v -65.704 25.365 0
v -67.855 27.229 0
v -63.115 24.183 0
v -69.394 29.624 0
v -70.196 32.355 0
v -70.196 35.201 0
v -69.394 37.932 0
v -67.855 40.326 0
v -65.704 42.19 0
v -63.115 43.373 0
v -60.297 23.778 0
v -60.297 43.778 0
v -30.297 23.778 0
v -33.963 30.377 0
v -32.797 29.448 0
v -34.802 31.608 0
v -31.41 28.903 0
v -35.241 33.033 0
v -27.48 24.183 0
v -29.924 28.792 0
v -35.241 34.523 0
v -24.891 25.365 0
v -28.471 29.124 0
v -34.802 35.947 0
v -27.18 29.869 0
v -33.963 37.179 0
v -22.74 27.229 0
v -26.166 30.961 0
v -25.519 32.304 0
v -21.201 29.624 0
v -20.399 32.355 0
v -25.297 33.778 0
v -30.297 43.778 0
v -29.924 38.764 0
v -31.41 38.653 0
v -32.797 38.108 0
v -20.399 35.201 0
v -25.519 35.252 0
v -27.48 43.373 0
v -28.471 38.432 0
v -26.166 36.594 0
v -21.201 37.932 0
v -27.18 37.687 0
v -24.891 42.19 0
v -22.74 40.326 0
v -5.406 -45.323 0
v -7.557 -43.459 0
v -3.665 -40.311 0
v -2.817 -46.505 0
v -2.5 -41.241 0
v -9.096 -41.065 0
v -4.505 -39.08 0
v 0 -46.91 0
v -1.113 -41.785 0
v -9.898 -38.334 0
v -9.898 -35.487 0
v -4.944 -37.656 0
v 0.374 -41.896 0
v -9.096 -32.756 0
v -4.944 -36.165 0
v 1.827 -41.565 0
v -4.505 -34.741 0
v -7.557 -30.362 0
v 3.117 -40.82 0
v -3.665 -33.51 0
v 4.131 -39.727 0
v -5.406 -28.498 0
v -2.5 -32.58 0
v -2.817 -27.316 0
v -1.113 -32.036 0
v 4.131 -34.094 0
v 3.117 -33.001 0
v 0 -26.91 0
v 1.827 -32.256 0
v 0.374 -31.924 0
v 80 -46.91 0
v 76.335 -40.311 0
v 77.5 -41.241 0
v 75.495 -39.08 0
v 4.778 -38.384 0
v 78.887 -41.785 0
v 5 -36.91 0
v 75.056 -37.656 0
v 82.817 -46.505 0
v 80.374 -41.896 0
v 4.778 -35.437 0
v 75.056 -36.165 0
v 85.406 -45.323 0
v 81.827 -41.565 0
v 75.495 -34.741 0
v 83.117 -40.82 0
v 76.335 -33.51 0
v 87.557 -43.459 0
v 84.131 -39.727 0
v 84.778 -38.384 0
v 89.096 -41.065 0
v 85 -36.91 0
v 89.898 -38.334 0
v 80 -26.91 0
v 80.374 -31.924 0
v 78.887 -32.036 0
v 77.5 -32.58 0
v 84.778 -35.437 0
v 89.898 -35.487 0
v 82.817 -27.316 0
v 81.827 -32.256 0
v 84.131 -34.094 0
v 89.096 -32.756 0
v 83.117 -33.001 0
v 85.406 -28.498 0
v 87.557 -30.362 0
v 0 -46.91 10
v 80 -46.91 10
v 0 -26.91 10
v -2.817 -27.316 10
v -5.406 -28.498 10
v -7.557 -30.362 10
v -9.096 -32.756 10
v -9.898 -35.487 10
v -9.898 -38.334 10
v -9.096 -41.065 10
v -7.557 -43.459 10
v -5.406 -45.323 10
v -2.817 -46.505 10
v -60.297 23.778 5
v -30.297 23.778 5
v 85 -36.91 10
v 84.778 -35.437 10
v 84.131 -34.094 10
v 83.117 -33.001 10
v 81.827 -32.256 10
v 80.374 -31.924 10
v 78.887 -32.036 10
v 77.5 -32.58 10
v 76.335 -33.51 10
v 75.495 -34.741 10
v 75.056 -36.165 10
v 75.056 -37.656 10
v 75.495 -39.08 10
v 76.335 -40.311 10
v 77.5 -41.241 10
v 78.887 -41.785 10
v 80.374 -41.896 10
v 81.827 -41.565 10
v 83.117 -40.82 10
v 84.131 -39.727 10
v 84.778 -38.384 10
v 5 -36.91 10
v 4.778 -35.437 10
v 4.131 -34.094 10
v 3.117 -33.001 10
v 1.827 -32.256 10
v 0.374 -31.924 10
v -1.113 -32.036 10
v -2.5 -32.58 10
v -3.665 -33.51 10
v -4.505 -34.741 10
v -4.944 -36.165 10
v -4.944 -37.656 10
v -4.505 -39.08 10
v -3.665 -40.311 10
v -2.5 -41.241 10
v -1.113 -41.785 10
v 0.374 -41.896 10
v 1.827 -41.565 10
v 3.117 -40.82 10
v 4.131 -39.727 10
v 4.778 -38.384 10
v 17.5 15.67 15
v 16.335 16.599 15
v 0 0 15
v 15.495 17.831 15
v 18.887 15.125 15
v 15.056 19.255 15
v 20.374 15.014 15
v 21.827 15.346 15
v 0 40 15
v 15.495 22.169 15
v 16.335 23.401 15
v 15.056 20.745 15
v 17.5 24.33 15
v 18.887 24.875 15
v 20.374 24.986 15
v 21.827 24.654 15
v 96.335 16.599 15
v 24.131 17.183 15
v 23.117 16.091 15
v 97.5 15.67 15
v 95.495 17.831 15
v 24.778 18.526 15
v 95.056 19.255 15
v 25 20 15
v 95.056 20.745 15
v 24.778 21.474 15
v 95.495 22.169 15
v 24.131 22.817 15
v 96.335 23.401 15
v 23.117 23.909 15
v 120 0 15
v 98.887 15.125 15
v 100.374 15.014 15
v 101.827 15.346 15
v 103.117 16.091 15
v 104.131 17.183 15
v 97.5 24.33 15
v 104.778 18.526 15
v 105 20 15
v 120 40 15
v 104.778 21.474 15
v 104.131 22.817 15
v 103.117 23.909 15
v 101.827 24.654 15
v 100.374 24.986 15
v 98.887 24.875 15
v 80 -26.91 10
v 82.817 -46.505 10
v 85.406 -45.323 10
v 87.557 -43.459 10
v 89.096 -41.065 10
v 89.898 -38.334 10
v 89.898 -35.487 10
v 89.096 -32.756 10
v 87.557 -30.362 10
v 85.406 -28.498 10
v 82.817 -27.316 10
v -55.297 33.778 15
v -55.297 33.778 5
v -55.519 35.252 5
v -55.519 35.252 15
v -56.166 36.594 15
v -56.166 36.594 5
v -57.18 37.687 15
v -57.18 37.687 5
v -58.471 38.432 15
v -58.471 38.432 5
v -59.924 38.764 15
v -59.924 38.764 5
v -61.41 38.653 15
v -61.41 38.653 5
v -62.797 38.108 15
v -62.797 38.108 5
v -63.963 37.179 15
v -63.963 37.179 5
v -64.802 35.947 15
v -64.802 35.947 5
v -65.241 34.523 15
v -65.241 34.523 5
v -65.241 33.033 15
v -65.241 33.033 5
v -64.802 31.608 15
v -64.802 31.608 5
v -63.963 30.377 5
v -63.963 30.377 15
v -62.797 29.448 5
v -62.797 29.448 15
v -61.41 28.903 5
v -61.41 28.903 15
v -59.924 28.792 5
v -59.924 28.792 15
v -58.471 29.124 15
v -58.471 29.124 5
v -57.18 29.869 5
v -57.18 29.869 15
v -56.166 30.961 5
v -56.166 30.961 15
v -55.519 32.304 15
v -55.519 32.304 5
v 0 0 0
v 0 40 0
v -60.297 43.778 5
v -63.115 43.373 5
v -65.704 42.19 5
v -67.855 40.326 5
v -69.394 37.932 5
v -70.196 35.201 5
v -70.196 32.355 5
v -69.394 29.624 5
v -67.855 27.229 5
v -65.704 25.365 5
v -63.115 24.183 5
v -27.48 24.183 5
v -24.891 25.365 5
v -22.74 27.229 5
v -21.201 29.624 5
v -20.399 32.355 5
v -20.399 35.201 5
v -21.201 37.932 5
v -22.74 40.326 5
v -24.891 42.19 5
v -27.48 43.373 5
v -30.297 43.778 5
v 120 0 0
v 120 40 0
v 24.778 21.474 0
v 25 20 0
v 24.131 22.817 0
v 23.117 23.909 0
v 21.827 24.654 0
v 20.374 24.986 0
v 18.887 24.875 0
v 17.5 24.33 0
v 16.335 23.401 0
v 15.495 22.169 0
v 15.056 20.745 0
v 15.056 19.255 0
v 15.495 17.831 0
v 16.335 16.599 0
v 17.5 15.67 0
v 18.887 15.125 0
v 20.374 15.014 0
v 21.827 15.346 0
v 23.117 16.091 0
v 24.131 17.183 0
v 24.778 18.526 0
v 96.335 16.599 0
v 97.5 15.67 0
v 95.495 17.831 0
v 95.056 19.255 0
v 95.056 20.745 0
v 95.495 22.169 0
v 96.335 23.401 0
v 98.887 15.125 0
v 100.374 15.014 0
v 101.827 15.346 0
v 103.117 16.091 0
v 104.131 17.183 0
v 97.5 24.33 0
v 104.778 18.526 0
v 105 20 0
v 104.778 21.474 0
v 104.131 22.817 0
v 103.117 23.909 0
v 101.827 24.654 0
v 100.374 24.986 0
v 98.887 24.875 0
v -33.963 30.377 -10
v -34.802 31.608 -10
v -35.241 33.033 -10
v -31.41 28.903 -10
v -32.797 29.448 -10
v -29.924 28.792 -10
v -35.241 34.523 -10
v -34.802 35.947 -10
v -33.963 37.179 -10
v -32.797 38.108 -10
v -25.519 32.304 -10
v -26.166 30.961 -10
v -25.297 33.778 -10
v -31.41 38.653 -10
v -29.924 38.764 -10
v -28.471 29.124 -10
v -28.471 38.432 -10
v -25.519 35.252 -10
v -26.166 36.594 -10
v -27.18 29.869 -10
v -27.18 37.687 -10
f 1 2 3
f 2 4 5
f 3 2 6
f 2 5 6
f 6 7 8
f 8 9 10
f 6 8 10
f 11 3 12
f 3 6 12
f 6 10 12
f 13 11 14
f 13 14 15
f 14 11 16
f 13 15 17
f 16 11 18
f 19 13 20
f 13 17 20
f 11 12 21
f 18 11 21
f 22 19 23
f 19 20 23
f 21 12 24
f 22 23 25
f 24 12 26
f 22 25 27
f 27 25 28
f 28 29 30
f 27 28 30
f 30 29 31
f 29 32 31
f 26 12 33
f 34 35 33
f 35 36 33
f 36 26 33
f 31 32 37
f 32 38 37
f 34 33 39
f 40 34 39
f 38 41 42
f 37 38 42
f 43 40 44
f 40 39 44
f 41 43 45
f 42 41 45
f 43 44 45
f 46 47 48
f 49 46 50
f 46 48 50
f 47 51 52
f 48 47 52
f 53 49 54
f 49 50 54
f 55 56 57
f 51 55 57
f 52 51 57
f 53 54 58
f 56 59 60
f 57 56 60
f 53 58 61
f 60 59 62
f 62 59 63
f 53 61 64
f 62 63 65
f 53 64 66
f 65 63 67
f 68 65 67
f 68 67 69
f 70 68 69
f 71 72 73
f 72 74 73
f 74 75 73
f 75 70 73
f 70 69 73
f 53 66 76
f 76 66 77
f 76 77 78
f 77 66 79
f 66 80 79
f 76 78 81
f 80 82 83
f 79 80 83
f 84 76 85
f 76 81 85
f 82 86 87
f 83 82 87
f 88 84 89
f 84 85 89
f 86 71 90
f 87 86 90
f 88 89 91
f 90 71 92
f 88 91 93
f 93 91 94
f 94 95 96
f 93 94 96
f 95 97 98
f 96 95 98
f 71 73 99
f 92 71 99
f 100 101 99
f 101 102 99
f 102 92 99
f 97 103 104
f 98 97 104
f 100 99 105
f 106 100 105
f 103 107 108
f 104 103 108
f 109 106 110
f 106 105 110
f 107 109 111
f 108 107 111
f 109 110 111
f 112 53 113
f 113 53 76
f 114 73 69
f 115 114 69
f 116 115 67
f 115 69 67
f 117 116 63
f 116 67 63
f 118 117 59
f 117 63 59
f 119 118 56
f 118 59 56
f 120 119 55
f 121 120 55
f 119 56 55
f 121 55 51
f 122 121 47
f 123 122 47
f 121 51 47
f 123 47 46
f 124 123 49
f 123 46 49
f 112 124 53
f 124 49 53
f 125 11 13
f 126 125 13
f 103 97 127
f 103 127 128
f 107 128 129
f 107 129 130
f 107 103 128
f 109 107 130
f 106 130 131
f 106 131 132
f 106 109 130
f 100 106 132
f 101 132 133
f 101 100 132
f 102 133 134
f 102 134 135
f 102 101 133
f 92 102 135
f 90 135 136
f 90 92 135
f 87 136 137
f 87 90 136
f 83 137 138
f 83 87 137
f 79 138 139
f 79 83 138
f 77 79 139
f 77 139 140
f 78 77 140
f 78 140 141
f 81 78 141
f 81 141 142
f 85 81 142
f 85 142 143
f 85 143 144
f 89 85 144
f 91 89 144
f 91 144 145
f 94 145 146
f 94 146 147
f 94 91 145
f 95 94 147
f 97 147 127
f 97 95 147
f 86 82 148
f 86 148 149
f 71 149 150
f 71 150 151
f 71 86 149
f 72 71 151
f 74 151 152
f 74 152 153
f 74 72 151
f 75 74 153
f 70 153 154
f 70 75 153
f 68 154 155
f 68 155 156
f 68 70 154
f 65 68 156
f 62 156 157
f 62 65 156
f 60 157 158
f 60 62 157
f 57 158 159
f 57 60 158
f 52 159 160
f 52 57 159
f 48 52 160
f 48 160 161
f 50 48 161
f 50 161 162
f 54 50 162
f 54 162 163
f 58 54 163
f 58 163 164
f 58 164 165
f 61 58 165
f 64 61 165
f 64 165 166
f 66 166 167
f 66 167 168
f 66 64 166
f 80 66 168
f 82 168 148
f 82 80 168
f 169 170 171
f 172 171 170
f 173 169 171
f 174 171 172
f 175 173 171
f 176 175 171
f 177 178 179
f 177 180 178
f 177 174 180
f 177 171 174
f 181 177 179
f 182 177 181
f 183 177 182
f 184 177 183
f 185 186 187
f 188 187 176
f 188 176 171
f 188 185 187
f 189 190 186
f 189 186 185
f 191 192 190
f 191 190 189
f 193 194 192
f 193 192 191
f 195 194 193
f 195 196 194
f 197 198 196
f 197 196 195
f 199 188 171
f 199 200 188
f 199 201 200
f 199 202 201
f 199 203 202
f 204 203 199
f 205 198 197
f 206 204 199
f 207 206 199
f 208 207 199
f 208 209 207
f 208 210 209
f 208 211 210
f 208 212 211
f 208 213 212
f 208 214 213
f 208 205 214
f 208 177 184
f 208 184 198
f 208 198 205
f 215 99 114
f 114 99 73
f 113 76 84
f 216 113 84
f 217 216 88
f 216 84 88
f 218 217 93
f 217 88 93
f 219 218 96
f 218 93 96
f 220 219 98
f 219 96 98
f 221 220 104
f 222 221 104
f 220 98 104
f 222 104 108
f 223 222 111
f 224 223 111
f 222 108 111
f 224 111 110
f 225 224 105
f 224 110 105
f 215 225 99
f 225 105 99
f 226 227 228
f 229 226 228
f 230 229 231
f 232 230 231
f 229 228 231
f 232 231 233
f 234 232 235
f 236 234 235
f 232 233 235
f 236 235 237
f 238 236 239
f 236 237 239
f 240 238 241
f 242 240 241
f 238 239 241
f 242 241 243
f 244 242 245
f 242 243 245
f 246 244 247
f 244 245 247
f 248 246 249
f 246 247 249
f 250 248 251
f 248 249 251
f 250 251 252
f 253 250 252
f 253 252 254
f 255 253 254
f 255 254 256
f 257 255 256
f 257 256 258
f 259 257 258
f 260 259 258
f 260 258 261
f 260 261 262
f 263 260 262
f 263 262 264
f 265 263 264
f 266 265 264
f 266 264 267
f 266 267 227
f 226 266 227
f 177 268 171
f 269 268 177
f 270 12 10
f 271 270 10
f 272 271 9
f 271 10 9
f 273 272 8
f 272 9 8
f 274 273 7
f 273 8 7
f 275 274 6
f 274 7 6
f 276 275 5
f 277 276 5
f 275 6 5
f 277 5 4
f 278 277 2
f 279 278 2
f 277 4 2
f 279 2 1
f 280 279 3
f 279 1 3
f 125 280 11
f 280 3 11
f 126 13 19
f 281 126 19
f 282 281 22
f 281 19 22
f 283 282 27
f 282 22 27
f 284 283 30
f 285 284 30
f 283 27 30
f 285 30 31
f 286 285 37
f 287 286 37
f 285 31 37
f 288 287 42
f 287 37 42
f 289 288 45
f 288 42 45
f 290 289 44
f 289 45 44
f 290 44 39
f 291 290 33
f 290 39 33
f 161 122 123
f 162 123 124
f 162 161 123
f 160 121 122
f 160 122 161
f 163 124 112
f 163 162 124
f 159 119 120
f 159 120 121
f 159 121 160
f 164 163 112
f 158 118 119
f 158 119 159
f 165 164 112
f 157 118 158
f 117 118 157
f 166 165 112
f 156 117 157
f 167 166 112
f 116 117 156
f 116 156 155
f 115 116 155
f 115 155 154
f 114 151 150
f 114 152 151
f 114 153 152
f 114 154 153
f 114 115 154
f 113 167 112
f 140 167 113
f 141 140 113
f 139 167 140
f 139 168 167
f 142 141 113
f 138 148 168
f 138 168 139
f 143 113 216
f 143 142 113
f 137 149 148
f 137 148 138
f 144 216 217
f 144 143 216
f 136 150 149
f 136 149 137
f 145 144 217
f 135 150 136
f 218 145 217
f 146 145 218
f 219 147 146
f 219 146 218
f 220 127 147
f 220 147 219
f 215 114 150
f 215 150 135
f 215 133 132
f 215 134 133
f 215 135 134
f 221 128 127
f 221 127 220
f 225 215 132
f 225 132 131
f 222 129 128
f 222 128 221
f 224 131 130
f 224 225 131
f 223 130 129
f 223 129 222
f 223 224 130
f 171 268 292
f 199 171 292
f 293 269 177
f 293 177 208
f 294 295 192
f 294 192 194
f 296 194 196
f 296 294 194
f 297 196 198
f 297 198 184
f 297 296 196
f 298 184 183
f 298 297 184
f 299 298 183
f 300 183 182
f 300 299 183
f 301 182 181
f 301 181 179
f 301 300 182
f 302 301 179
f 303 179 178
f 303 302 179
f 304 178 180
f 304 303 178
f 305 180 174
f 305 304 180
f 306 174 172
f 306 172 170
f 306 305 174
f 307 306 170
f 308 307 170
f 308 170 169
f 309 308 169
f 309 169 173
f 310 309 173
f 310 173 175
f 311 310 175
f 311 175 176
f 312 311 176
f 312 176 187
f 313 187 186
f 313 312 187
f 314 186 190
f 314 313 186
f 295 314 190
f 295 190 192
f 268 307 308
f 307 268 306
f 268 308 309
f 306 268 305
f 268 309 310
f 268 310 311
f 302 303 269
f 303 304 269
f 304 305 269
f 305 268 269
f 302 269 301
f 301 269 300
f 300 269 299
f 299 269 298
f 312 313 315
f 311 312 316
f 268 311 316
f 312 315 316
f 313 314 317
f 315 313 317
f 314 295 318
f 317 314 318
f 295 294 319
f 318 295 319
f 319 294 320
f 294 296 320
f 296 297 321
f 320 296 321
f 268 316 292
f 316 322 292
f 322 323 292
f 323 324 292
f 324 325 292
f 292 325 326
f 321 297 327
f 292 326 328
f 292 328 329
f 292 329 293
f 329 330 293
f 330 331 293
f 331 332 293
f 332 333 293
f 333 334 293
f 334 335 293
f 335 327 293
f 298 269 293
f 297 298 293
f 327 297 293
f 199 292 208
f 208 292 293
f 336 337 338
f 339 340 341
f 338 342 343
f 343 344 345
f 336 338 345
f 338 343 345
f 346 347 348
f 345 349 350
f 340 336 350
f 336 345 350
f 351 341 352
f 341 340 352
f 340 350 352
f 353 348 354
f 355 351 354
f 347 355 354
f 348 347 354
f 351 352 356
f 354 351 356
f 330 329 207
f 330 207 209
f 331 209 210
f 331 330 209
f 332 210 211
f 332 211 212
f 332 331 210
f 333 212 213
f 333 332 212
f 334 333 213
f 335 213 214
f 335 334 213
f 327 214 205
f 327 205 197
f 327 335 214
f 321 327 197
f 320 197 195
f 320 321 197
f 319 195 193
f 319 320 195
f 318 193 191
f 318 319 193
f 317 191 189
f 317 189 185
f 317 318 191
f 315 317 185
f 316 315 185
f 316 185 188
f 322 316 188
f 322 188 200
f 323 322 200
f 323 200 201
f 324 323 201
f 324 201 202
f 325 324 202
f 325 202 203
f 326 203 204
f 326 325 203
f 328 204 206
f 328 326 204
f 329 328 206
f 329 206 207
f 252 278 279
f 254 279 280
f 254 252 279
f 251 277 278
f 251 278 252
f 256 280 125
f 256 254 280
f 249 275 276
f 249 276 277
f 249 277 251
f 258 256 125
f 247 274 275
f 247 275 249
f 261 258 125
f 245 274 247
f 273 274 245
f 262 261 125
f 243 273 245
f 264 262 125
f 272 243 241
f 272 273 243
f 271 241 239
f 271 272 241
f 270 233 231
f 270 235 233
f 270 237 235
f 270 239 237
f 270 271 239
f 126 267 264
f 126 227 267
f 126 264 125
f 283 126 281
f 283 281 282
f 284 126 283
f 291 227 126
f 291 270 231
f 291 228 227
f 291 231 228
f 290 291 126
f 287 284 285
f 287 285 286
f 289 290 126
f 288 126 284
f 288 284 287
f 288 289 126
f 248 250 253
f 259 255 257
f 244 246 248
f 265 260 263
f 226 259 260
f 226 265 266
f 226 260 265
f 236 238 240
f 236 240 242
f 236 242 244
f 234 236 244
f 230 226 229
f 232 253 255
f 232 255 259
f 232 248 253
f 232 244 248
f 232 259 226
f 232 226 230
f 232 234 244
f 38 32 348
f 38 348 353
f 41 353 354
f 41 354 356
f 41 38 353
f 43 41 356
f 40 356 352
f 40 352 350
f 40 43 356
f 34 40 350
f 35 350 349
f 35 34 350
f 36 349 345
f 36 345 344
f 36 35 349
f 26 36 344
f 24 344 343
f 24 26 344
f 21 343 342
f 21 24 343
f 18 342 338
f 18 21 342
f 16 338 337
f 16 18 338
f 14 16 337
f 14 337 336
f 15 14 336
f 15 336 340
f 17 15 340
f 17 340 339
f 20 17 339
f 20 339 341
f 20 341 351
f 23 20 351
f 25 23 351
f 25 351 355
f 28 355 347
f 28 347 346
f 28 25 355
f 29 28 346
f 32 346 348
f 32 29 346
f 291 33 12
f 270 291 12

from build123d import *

# Parameters (mm, degrees)
F0_W          = 120
F0_H          = 40
F0_R          = 5
F1_DEPTH      = 15
F2_DEPTH      = 5
F3_DEPTH      = 15
F4_DEPTH      = 10
F4_DEPTH_BACK = 5
F5_DEPTH      = 10


with BuildPart() as f1:
    # F0 (on Top) → F1 (new body)
    with BuildSketch(Plane.XY):
        with Locations((60, 20)):
            Rectangle(F0_W, F0_H)
        with Locations((20, 20)):
            Circle(F0_R, mode=Mode.SUBTRACT)
        with Locations((100, 20)):
            Circle(F0_R, mode=Mode.SUBTRACT)
    extrude(amount=F1_DEPTH)


with BuildPart() as f2:
    # F0 (on Top) → F2 (new body)
    with BuildSketch(Plane.XY):
        with BuildLine():
            Line((-30.2973103523, 43.7778905034), (-60.2973103523, 43.7778905034))
            ThreePointArc((-60.2973103523, 43.7778905034), (-70.2973103523, 33.7778905034), (-60.2973103523, 23.7778905034))
            Line((-60.2973103523, 23.7778905034), (-30.2973103523, 23.7778905034))
            ThreePointArc((-30.2973103523, 23.7778905034), (-20.2973103523, 33.7778905034), (-30.2973103523, 43.7778905034))
        make_face()
        with Locations((-60.2973103523, 33.7778905034)):
            Circle(F0_R, mode=Mode.SUBTRACT)
        with Locations((-30.2973103523, 33.7778905034)):
            Circle(F0_R, mode=Mode.SUBTRACT)
    extrude(amount=F2_DEPTH)

    # F0 (on Top) → F3 (join)
    with BuildSketch(Plane.XY):
        with Locations((-60.2973103523, 33.7778905034)):
            Circle(F0_R)
    extrude(amount=F3_DEPTH)

    # F0 (on Top) → F4 (join, two sides)
    with BuildSketch(Plane.XY) as f4_sk:
        with Locations((-30.2973103523, 33.7778905034)):
            Circle(F0_R)
    extrude(amount=-F4_DEPTH)
    extrude(f4_sk.sketch, amount=F4_DEPTH_BACK)


with BuildPart() as f5:
    # F0 (on Top) → F5 (new body)
    with BuildSketch(Plane.XY):
        with BuildLine():
            Line((80, -26.9104737011), (0, -26.9104737011))
            ThreePointArc((0, -26.9104737011), (-10, -36.9104737011), (0, -46.9104737011))
            Line((0, -46.9104737011), (80, -46.9104737011))
            ThreePointArc((80, -46.9104737011), (90, -36.9104737011), (80, -26.9104737011))
        make_face()
        with Locations((0, -36.9104737011)):
            Circle(F0_R, mode=Mode.SUBTRACT)
        with Locations((80, -36.9104737011)):
            Circle(F0_R, mode=Mode.SUBTRACT)
    extrude(amount=F5_DEPTH)


solid = Compound([f1.part, f2.part, f5.part])
